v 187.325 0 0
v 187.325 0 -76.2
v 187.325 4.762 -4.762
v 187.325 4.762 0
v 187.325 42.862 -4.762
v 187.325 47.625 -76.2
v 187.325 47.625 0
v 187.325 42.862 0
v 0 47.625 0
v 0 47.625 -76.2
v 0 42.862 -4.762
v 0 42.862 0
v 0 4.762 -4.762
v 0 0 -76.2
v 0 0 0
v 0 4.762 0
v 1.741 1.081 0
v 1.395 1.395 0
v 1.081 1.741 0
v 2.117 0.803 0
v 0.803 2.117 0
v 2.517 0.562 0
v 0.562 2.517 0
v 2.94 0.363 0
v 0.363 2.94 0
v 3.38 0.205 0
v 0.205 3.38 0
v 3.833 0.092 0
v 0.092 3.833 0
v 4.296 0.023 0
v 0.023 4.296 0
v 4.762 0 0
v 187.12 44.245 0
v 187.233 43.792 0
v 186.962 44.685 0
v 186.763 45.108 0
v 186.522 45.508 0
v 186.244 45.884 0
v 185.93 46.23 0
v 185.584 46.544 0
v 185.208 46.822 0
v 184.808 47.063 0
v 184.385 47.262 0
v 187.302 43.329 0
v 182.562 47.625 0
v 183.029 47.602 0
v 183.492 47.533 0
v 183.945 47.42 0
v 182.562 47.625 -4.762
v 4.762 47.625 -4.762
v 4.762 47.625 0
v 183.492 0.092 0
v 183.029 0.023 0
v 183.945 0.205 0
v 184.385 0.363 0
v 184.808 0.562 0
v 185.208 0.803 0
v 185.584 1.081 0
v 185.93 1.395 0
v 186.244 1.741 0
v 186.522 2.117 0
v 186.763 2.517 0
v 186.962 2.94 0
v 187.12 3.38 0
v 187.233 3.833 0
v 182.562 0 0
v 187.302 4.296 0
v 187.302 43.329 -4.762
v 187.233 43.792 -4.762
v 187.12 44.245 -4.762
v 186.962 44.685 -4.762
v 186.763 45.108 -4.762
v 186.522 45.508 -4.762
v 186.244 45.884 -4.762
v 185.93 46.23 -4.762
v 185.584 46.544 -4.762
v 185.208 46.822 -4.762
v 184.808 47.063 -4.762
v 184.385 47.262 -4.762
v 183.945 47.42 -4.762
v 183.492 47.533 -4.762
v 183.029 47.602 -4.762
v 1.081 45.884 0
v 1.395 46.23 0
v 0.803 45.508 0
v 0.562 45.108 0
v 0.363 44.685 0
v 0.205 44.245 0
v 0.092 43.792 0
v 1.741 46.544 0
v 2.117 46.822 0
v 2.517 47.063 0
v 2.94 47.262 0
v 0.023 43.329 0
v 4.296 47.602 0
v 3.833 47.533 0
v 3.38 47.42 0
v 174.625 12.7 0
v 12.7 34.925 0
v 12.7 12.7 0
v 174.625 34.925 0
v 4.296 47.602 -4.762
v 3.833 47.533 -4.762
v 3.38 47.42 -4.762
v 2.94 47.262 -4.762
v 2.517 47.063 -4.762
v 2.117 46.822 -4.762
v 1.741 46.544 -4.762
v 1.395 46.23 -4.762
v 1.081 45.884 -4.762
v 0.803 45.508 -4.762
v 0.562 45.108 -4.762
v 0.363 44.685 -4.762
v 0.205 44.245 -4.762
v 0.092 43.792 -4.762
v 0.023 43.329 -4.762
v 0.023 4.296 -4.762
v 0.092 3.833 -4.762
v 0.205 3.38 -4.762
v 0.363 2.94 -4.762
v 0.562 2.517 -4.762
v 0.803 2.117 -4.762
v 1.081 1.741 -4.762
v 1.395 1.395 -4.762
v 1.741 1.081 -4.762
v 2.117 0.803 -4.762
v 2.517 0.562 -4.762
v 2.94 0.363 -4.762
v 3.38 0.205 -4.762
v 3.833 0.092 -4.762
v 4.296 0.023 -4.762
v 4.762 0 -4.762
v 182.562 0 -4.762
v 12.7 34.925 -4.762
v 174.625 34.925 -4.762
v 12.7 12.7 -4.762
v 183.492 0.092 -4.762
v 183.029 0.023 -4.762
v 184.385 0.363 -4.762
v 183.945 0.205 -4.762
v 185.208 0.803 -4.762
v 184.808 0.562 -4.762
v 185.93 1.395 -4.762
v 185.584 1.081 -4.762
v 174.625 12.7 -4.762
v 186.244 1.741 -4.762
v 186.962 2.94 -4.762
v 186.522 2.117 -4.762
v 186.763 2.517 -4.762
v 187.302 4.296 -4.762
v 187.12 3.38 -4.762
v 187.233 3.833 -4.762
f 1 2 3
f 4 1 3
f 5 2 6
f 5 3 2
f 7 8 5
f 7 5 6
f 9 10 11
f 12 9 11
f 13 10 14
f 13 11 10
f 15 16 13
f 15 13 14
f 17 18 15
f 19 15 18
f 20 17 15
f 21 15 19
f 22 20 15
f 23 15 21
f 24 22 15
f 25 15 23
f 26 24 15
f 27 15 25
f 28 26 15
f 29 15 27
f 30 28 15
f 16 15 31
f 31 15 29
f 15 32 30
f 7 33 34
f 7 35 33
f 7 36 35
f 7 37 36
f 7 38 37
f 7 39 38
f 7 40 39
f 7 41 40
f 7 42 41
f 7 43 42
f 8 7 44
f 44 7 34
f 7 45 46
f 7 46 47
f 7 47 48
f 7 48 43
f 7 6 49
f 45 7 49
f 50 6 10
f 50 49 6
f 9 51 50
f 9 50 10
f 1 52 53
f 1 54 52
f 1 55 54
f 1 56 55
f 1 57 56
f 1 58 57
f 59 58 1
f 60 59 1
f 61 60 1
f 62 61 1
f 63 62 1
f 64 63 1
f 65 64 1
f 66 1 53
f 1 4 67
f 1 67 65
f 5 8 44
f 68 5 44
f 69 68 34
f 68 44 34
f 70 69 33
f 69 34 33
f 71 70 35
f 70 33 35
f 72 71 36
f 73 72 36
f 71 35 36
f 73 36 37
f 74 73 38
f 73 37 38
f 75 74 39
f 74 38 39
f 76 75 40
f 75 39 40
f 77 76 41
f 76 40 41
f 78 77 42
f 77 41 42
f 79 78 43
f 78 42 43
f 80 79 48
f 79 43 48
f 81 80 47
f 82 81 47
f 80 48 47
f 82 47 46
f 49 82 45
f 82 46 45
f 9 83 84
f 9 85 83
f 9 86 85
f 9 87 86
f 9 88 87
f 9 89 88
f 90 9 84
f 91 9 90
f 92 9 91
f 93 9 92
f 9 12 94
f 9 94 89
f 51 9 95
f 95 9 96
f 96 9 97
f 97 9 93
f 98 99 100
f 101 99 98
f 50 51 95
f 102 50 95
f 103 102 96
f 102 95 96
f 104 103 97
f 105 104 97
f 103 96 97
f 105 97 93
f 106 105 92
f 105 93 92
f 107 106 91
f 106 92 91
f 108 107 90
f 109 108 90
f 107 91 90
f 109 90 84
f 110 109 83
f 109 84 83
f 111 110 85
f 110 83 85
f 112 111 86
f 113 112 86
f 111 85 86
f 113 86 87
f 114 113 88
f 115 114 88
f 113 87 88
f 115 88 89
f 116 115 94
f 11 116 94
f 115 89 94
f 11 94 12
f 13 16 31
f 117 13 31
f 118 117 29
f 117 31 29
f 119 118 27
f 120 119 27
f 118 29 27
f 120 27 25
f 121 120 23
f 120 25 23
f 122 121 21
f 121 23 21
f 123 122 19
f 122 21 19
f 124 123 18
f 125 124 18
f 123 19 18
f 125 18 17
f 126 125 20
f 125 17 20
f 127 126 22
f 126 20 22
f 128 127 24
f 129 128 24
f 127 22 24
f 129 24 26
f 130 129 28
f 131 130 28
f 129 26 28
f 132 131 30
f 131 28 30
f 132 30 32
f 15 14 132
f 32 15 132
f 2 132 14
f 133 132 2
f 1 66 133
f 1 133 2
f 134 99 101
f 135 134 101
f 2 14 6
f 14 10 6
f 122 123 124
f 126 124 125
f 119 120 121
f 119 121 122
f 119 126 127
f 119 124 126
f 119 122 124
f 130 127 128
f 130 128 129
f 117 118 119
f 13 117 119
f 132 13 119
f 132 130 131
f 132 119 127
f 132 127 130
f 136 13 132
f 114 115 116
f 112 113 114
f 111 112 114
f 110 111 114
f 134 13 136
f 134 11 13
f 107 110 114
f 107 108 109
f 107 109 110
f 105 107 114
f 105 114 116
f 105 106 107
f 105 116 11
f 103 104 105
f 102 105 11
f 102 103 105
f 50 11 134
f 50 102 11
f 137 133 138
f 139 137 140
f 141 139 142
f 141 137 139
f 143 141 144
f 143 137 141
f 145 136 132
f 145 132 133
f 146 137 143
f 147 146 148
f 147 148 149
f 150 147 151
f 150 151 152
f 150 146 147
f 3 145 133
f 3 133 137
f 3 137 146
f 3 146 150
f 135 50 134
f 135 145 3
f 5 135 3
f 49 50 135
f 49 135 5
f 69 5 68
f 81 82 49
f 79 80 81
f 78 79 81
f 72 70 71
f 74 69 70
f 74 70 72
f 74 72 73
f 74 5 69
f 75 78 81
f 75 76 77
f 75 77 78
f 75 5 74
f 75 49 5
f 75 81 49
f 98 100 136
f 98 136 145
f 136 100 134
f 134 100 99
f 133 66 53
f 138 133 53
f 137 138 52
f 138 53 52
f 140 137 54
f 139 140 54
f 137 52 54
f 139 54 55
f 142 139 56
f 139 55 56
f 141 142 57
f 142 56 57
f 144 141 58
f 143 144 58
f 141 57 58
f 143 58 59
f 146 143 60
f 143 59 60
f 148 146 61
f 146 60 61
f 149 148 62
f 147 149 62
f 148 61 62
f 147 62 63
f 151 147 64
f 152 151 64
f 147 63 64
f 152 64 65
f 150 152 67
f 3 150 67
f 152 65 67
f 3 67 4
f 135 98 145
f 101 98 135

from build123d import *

# Parameters (mm, degrees)
F1_DEPTH = 76.2
F2_W     = 161.925
F2_H     = 22.225
F3_DEPTH = 4.7625


with BuildPart() as f1:
    # F0 (on Top) → F1 (new body)
    with BuildSketch(Plane.XY):
        Polygon((0, 0), (4.7625, 0), (182.5625, 0), (187.325, 0), (187.325, 4.7625), (187.325, 42.8625), (187.325, 47.625), (182.5625, 47.625), (4.7625, 47.625), (0, 47.625), (0, 42.8625), (0, 4.7625), align=None)
    extrude(amount=-F1_DEPTH)

    # F2 (on face) → F3 (cut)
    with BuildSketch(Plane.XY):
        with BuildLine():
            Line((187.325, 4.7625), (187.325, 42.8625))
            ThreePointArc((187.325, 42.8625), (185.930096, 46.230096), (182.5625, 47.625))
            Line((182.5625, 47.625), (4.7625, 47.625))
            ThreePointArc((4.7625, 47.625), (1.394904, 46.230096), (0, 42.8625))
            Line((0, 42.8625), (0, 4.7625))
            ThreePointArc((0, 4.7625), (1.394904, 1.394904), (4.7625, 0))
            Line((4.7625, 0), (182.5625, 0))
            ThreePointArc((182.5625, 0), (185.930096, 1.394904), (187.325, 4.7625))
        make_face()
        with Locations((93.6625, 23.8125)):
            Rectangle(F2_W, F2_H, mode=Mode.SUBTRACT)
    extrude(amount=-F3_DEPTH, mode=Mode.SUBTRACT)


solid = f1.part
